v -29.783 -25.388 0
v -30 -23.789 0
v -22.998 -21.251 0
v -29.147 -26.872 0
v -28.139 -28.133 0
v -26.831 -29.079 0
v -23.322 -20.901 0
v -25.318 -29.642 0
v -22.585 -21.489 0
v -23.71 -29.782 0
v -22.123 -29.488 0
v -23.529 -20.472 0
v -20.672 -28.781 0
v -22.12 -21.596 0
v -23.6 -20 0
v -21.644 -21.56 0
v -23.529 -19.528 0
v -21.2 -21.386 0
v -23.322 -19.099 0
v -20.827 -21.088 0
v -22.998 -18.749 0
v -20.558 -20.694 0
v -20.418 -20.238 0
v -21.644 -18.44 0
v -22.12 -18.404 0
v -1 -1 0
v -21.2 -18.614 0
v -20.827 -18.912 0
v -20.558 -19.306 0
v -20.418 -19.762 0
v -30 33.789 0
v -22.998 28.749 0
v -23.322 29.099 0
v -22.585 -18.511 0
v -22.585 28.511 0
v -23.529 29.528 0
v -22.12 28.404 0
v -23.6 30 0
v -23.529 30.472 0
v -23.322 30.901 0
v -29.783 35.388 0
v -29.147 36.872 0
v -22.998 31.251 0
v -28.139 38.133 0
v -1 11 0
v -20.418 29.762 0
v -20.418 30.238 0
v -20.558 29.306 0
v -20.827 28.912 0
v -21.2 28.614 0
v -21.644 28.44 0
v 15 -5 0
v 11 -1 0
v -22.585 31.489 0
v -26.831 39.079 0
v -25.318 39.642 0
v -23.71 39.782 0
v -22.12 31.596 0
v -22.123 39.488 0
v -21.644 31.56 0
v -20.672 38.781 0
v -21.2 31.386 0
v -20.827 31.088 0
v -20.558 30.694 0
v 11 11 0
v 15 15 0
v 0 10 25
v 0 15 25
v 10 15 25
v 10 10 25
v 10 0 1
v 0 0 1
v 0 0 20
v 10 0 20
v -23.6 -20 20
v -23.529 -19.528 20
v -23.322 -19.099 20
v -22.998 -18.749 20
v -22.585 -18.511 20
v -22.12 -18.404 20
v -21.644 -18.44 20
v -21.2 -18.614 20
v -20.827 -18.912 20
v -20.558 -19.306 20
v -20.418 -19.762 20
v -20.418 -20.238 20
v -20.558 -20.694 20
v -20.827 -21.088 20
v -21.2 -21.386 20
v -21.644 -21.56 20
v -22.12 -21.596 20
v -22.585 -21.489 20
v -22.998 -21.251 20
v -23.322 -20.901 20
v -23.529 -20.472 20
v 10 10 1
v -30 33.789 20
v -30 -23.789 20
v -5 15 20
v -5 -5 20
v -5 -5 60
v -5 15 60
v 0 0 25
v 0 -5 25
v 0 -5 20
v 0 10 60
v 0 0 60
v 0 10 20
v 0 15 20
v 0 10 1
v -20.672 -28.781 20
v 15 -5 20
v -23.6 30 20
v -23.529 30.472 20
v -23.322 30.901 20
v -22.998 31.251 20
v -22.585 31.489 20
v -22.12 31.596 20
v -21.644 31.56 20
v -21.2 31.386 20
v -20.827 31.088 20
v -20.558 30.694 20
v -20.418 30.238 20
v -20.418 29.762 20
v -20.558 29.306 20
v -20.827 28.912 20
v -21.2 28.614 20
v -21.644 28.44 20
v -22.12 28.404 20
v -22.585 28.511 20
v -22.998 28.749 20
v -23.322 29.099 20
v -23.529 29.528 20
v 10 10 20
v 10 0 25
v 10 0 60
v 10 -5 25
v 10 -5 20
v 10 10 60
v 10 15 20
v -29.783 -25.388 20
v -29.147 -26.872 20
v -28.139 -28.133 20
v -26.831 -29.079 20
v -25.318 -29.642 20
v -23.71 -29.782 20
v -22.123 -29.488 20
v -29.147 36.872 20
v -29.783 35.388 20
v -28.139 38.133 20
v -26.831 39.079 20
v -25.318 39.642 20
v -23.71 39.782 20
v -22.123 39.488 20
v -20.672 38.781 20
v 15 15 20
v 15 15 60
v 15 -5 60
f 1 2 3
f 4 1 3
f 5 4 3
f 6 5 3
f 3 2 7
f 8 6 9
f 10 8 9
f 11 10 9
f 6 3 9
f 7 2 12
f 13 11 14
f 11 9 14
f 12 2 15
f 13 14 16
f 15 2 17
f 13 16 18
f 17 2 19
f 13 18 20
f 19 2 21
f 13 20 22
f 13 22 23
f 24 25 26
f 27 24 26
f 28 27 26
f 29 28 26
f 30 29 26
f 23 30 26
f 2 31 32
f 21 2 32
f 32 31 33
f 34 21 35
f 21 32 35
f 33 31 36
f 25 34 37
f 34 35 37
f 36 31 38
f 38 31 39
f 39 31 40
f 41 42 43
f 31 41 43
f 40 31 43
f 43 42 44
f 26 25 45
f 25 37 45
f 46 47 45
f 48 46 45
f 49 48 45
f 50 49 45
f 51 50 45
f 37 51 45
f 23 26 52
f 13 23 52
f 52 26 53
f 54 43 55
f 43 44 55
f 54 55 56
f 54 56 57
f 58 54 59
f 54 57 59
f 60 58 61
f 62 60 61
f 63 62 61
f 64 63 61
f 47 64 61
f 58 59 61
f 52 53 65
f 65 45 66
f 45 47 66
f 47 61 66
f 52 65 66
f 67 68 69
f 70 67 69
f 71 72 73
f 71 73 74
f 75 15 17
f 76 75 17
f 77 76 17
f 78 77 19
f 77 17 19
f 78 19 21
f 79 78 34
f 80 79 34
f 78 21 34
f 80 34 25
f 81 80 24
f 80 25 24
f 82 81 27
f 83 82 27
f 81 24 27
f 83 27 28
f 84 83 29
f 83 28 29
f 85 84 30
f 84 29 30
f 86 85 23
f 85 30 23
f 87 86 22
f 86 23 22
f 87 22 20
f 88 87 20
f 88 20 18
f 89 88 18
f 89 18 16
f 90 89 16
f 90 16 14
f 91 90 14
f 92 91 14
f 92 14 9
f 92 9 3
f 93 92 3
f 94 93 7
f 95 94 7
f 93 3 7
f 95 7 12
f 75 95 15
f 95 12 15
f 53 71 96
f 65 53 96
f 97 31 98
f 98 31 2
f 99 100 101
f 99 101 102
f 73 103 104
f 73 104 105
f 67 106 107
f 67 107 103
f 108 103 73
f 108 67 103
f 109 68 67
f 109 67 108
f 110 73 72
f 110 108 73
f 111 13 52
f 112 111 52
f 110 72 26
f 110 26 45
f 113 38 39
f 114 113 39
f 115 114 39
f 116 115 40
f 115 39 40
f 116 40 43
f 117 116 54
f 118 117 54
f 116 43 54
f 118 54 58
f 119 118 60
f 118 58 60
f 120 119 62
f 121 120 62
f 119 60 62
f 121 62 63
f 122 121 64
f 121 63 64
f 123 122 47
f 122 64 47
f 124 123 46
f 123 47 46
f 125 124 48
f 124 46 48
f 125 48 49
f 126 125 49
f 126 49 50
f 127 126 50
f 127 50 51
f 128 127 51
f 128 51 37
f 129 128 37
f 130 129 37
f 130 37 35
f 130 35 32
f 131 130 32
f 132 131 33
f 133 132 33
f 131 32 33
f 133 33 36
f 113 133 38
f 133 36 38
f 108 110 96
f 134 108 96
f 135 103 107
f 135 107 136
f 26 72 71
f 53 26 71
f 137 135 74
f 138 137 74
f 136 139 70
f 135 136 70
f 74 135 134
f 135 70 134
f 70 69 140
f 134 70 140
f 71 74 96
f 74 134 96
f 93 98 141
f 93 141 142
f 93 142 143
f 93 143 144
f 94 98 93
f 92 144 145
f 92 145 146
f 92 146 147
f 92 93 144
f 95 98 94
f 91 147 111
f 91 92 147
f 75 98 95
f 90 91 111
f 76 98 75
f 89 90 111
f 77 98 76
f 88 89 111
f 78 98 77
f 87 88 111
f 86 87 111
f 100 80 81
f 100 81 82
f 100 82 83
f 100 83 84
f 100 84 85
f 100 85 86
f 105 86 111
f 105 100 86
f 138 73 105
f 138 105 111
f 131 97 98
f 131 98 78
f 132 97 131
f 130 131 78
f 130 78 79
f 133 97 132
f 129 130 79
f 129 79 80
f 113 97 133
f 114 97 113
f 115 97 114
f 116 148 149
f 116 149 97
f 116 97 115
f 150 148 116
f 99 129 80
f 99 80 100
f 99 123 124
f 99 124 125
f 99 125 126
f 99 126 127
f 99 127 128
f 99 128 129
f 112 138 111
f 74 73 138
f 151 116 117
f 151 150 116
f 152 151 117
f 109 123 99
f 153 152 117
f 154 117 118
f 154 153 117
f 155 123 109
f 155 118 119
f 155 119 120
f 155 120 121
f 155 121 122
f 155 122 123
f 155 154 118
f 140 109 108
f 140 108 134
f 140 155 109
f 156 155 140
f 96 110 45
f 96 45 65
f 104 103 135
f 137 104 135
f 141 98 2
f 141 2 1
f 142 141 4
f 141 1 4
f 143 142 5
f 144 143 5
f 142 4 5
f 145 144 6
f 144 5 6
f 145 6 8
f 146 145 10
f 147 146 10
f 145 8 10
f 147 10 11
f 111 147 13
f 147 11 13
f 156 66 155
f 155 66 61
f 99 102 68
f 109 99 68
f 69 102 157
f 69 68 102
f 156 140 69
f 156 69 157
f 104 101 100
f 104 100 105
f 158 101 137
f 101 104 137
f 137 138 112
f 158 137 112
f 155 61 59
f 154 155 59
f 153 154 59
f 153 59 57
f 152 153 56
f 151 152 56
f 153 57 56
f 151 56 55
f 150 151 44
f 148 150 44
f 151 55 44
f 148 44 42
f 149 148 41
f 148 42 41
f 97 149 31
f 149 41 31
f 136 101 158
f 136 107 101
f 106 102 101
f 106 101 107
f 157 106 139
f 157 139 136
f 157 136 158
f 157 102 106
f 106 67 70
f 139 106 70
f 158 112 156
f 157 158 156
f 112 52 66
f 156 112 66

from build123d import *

# Parameters (mm, degrees)
SKETCH_1_W          = 20
SKETCH_1_H          = 20
SKETCH_1_W_2        = 10
SKETCH_1_H_2        = 10
EXTRUDE_1_DEPTH     = 60
SKETCH_2_W          = 10
SKETCH_2_H          = 5
CUT_EXTRUDE_1_DEPTH = 80
SKETCH_4_R          = 1.6
EXTRUDE_3_DEPTH     = 20
CHAMFER_1_SIZE      = 1


with BuildPart() as part:
    # 草图1 → 凸台-拉伸1 (new body)
    with BuildSketch(Plane.XY):
        with Locations((5, 5)):
            Rectangle(SKETCH_1_W, SKETCH_1_H)
        with Locations((5, 5)):
            Rectangle(SKETCH_1_W_2, SKETCH_1_H_2, mode=Mode.SUBTRACT)
    extrude(amount=EXTRUDE_1_DEPTH)

    # 草图2 → 切除-拉伸1 (cut)
    with BuildSketch(Plane(origin=(0, 15, 0), x_dir=(1, 0, 0), z_dir=(0, 1, 0))):
        with Locations((5, -22.5)):
            Rectangle(SKETCH_2_W, SKETCH_2_H)
    extrude(amount=-CUT_EXTRUDE_1_DEPTH, mode=Mode.SUBTRACT)

    # 草图4 → 凸台-拉伸3 (add)
    with BuildSketch(Plane(origin=(0, 0, 0), x_dir=(-1, 0, 0), z_dir=(0, 0, -1))):
        with BuildLine():
            Line((30, 33.788897449), (30, -23.788897449))
            ThreePointArc((30, -23.788897449), (26.831147553, -29.078945042), (20.671798823, -28.781199215))
            Line((20.671798823, -28.781199215), (-15, -5))
            Line((-15, -5), (5, -5))
            Line((5, -5), (5, 15))
            Line((5, 15), (-15, 15))
            Line((-15, 15), (20.671798823, 38.781199215))
            ThreePointArc((20.671798823, 38.781199215), (26.831147553, 39.078945042), (30, 33.788897449))
        make_face()
        with Locations((22, -20)):
            Circle(SKETCH_4_R, mode=Mode.SUBTRACT)
        with Locations((22, 30)):
            Circle(SKETCH_4_R, mode=Mode.SUBTRACT)
    extrude(amount=-EXTRUDE_3_DEPTH)

    # 倒角1
    chamfer_1_edges = [part.edges().sort_by_distance(p)[0] for p in [
        (0, 5, 0),
        (5, 0, 0),
        (10, 5, 0),
        (5, 10, 0),
    ]]
    chamfer(chamfer_1_edges, length=CHAMFER_1_SIZE)


solid = part.part
